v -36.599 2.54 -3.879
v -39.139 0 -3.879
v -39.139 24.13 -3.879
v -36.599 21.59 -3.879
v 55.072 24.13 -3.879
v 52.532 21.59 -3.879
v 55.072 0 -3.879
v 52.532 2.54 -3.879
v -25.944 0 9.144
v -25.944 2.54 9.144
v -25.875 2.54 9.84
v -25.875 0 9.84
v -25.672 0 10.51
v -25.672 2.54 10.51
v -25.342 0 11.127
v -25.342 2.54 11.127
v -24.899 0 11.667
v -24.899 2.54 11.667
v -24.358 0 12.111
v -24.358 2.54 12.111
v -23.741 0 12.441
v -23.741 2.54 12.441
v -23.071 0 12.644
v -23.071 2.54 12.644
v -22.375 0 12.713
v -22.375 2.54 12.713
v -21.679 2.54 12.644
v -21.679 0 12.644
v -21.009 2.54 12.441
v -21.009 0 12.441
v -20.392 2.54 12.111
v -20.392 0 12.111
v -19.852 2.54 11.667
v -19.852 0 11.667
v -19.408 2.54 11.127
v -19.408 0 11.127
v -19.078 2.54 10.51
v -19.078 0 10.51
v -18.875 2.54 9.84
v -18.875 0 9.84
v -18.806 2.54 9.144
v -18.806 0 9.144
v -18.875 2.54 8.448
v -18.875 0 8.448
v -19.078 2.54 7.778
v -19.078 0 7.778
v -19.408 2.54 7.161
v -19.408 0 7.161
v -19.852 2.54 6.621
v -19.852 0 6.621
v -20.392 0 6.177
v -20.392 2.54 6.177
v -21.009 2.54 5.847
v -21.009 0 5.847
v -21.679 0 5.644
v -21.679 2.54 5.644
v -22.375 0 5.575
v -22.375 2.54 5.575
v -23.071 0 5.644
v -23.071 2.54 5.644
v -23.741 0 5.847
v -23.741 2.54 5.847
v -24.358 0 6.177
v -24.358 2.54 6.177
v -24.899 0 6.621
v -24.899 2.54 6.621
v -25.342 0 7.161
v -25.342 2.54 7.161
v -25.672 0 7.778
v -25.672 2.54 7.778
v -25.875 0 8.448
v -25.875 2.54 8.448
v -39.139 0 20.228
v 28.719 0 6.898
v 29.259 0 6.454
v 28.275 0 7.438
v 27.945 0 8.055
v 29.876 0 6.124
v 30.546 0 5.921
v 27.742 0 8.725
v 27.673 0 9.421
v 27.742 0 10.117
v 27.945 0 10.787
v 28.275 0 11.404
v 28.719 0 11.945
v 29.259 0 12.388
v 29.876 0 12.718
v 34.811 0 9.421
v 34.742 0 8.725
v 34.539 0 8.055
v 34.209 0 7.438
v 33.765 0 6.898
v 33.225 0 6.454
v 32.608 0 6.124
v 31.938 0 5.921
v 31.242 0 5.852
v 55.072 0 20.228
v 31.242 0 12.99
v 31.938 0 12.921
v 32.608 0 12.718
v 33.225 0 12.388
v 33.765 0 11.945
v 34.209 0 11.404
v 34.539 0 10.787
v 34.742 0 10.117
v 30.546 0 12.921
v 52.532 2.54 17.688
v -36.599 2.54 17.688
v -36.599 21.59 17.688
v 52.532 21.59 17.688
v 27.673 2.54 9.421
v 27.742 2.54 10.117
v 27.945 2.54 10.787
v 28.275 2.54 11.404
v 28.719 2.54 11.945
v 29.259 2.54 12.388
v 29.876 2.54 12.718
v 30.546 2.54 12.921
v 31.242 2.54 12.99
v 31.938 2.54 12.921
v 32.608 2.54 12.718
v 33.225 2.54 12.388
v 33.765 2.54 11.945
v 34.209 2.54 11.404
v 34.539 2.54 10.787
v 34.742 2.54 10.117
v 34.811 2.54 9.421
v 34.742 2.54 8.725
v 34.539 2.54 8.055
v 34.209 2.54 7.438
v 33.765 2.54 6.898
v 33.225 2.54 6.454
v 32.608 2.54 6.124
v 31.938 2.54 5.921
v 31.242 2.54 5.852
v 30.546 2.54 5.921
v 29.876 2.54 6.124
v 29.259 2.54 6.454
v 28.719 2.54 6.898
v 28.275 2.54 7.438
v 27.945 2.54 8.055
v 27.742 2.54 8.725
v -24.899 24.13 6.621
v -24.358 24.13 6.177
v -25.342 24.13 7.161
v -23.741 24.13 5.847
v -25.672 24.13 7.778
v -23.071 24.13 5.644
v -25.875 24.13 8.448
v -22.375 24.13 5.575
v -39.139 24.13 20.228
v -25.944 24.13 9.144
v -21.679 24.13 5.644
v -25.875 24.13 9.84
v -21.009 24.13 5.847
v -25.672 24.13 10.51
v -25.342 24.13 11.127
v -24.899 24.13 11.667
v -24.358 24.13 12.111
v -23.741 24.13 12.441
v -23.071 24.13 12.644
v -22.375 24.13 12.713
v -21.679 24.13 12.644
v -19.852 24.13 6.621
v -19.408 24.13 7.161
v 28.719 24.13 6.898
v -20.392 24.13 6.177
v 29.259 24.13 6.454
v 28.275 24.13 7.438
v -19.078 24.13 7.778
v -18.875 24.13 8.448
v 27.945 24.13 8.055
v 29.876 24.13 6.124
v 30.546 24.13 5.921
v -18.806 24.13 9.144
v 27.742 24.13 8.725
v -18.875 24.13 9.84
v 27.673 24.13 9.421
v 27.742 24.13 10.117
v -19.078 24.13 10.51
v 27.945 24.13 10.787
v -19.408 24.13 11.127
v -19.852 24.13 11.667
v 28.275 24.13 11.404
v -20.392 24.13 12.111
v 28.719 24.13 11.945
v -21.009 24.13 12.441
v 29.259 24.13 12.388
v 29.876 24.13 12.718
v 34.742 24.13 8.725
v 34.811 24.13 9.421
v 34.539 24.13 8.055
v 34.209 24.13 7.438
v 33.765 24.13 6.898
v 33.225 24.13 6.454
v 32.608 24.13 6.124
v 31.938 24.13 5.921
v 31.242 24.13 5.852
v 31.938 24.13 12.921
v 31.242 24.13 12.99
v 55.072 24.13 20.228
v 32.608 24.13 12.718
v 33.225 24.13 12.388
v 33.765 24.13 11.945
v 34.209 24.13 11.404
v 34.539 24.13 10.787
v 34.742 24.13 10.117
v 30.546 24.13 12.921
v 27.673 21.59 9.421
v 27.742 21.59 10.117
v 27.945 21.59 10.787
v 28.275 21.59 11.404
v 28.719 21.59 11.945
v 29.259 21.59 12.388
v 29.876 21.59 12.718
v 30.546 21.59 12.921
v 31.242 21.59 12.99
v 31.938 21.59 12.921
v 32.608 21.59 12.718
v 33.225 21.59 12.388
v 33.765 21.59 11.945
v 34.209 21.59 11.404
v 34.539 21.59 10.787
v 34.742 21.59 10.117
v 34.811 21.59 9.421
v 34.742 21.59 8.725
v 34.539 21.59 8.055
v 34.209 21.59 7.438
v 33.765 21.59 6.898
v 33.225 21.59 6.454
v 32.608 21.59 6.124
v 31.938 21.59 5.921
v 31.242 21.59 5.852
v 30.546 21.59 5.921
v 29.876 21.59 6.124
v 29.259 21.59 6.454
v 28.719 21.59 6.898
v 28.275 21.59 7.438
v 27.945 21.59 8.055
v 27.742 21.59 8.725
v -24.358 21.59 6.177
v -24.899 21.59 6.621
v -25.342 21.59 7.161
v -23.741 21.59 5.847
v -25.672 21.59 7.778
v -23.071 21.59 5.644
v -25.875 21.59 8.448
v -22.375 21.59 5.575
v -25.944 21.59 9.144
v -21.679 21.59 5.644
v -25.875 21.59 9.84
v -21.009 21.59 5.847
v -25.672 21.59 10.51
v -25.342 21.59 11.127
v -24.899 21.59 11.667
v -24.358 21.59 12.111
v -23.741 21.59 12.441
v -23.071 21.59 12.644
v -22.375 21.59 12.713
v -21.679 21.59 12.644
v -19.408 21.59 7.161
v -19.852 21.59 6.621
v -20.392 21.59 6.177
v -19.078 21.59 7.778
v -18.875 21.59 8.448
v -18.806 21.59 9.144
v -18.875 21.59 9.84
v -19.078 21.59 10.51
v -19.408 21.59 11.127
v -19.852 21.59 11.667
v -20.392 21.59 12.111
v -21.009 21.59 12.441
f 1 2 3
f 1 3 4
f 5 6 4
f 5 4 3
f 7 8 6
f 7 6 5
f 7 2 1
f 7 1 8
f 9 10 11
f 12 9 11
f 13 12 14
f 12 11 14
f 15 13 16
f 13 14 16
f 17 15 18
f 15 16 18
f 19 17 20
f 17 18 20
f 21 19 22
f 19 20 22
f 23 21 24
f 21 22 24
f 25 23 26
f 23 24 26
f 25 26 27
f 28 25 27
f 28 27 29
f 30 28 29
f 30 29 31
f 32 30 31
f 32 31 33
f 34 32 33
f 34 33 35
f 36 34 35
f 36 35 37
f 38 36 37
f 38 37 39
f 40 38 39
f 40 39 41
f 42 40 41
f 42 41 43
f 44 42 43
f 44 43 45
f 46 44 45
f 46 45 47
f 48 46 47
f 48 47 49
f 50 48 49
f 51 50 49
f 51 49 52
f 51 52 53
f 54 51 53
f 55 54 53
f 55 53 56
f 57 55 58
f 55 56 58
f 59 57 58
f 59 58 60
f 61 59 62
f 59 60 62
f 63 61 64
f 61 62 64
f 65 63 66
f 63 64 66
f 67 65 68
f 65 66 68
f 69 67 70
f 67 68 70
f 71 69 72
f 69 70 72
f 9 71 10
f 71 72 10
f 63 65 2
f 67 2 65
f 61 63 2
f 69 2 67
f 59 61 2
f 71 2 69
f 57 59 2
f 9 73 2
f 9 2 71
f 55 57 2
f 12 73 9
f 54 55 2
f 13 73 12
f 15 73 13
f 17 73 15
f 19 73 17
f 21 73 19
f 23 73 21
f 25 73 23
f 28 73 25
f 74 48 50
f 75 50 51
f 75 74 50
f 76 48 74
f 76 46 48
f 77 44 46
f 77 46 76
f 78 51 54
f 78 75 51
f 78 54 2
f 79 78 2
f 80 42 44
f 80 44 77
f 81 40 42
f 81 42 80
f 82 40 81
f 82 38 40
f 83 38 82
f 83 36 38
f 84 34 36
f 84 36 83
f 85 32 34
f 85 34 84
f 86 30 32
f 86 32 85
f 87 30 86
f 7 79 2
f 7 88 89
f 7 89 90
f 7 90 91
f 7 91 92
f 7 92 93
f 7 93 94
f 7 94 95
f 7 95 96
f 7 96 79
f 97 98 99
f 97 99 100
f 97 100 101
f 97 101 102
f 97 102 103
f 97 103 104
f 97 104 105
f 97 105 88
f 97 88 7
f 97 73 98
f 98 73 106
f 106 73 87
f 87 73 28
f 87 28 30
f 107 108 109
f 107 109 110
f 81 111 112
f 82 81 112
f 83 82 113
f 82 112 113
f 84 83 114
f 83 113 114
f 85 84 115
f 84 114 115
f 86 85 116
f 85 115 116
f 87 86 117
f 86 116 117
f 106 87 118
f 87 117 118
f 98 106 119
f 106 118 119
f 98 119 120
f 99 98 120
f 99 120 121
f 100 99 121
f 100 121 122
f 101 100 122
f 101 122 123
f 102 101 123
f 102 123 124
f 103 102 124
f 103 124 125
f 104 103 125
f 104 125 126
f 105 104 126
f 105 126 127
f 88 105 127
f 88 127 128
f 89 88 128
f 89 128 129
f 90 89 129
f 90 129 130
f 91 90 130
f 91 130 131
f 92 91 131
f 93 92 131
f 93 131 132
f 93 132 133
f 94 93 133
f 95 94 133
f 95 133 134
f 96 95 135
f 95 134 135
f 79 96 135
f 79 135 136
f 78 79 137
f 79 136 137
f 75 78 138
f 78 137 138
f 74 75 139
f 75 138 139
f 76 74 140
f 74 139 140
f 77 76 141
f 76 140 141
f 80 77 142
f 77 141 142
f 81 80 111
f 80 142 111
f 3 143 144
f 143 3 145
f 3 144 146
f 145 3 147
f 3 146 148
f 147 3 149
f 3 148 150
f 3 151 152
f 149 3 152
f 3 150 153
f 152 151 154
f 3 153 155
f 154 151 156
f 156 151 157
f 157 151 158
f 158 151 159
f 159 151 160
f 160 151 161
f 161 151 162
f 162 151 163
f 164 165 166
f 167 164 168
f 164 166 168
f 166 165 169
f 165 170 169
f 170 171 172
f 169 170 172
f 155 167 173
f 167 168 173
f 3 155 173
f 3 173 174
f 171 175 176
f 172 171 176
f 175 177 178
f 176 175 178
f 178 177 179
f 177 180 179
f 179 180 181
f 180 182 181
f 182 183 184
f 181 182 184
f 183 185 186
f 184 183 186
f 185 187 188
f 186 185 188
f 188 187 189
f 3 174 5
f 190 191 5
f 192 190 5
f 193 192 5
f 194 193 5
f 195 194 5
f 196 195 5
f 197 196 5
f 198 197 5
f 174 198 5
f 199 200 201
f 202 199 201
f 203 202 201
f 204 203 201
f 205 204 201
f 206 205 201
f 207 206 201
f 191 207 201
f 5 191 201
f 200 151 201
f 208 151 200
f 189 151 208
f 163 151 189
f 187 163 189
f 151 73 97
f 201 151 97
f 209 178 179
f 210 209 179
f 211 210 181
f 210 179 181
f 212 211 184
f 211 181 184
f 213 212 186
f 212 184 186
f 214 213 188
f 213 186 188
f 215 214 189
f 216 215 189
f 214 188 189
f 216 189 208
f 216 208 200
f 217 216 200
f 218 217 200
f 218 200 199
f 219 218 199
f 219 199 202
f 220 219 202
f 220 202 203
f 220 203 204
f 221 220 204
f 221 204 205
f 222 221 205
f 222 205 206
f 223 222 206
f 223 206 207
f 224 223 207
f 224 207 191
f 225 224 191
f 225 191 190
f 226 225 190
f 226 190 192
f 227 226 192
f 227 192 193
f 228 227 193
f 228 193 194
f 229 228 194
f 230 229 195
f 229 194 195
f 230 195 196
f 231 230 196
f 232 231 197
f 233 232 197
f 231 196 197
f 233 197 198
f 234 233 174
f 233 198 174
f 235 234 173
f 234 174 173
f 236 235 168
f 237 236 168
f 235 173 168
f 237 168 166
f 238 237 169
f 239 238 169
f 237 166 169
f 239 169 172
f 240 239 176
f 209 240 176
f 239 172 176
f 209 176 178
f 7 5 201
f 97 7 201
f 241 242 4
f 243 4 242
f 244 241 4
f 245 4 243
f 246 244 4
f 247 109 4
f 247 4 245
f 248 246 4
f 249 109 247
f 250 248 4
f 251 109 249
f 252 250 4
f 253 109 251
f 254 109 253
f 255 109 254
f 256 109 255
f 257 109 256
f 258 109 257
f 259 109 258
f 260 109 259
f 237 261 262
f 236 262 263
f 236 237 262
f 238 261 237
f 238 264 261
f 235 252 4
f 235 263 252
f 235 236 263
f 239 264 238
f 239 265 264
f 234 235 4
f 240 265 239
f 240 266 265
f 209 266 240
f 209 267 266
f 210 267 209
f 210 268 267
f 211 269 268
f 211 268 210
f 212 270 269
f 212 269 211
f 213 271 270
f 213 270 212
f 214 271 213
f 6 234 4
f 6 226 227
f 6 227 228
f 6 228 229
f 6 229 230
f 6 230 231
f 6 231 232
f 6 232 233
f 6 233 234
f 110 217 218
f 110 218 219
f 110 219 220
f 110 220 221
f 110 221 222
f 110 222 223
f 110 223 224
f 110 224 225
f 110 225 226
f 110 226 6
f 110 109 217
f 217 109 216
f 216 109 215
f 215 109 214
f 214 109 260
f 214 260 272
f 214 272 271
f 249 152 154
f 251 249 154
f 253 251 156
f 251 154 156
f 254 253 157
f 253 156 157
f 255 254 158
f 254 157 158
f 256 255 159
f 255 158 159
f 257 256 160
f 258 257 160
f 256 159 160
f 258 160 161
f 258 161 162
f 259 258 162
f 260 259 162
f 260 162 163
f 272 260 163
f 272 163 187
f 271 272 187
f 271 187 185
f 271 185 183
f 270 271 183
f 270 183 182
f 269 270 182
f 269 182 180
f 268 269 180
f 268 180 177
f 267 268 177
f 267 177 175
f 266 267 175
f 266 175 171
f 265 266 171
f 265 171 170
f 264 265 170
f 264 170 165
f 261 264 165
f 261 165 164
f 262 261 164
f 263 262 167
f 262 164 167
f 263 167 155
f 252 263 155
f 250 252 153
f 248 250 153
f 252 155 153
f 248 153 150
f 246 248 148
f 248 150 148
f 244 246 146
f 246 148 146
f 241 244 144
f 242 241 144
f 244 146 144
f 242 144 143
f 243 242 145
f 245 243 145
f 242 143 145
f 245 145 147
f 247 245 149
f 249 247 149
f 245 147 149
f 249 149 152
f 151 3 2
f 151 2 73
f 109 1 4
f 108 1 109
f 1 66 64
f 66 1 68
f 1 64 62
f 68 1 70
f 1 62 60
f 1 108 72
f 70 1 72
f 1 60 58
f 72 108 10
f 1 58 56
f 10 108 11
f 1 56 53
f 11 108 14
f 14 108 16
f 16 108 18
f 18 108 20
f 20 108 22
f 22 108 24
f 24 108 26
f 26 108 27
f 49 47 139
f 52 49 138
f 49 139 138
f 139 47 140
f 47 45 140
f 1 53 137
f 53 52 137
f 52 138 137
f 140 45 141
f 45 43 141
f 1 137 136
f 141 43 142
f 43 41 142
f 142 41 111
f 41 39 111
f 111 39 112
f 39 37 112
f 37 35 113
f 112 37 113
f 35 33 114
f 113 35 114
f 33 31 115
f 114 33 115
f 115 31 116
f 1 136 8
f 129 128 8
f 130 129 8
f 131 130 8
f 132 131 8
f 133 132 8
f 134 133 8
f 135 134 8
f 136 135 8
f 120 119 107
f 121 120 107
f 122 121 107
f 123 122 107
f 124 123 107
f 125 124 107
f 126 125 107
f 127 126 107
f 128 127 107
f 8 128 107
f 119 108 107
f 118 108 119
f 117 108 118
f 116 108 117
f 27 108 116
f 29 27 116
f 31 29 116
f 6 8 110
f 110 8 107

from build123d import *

# Parameters (mm, degrees)
F0_W     = 94.210912
F0_H     = 24.106908
F1_DEPTH = 24.13
F2_T     = -2.54
F4_D     = 7.1374


with BuildPart() as f1:
    # F0 (on Front) → F1 (new body)
    with BuildSketch(Plane.XZ):
        with Locations((7.966364, 8.174181)):
            Rectangle(F0_W, F0_H)
    extrude(amount=-F1_DEPTH)

    # F2
    f2_openings = [f1.faces().sort_by_distance(p)[0] for p in [
        (7.966364, 12.065, -3.879273),
    ]]
    offset(amount=F2_T, openings=f2_openings)

    # F4 (through all)
    with Locations(Plane.XZ):
        with Locations((-22.375092, 9.144), (31.242, 9.421091)):
            Hole(F4_D / 2)


solid = f1.part
